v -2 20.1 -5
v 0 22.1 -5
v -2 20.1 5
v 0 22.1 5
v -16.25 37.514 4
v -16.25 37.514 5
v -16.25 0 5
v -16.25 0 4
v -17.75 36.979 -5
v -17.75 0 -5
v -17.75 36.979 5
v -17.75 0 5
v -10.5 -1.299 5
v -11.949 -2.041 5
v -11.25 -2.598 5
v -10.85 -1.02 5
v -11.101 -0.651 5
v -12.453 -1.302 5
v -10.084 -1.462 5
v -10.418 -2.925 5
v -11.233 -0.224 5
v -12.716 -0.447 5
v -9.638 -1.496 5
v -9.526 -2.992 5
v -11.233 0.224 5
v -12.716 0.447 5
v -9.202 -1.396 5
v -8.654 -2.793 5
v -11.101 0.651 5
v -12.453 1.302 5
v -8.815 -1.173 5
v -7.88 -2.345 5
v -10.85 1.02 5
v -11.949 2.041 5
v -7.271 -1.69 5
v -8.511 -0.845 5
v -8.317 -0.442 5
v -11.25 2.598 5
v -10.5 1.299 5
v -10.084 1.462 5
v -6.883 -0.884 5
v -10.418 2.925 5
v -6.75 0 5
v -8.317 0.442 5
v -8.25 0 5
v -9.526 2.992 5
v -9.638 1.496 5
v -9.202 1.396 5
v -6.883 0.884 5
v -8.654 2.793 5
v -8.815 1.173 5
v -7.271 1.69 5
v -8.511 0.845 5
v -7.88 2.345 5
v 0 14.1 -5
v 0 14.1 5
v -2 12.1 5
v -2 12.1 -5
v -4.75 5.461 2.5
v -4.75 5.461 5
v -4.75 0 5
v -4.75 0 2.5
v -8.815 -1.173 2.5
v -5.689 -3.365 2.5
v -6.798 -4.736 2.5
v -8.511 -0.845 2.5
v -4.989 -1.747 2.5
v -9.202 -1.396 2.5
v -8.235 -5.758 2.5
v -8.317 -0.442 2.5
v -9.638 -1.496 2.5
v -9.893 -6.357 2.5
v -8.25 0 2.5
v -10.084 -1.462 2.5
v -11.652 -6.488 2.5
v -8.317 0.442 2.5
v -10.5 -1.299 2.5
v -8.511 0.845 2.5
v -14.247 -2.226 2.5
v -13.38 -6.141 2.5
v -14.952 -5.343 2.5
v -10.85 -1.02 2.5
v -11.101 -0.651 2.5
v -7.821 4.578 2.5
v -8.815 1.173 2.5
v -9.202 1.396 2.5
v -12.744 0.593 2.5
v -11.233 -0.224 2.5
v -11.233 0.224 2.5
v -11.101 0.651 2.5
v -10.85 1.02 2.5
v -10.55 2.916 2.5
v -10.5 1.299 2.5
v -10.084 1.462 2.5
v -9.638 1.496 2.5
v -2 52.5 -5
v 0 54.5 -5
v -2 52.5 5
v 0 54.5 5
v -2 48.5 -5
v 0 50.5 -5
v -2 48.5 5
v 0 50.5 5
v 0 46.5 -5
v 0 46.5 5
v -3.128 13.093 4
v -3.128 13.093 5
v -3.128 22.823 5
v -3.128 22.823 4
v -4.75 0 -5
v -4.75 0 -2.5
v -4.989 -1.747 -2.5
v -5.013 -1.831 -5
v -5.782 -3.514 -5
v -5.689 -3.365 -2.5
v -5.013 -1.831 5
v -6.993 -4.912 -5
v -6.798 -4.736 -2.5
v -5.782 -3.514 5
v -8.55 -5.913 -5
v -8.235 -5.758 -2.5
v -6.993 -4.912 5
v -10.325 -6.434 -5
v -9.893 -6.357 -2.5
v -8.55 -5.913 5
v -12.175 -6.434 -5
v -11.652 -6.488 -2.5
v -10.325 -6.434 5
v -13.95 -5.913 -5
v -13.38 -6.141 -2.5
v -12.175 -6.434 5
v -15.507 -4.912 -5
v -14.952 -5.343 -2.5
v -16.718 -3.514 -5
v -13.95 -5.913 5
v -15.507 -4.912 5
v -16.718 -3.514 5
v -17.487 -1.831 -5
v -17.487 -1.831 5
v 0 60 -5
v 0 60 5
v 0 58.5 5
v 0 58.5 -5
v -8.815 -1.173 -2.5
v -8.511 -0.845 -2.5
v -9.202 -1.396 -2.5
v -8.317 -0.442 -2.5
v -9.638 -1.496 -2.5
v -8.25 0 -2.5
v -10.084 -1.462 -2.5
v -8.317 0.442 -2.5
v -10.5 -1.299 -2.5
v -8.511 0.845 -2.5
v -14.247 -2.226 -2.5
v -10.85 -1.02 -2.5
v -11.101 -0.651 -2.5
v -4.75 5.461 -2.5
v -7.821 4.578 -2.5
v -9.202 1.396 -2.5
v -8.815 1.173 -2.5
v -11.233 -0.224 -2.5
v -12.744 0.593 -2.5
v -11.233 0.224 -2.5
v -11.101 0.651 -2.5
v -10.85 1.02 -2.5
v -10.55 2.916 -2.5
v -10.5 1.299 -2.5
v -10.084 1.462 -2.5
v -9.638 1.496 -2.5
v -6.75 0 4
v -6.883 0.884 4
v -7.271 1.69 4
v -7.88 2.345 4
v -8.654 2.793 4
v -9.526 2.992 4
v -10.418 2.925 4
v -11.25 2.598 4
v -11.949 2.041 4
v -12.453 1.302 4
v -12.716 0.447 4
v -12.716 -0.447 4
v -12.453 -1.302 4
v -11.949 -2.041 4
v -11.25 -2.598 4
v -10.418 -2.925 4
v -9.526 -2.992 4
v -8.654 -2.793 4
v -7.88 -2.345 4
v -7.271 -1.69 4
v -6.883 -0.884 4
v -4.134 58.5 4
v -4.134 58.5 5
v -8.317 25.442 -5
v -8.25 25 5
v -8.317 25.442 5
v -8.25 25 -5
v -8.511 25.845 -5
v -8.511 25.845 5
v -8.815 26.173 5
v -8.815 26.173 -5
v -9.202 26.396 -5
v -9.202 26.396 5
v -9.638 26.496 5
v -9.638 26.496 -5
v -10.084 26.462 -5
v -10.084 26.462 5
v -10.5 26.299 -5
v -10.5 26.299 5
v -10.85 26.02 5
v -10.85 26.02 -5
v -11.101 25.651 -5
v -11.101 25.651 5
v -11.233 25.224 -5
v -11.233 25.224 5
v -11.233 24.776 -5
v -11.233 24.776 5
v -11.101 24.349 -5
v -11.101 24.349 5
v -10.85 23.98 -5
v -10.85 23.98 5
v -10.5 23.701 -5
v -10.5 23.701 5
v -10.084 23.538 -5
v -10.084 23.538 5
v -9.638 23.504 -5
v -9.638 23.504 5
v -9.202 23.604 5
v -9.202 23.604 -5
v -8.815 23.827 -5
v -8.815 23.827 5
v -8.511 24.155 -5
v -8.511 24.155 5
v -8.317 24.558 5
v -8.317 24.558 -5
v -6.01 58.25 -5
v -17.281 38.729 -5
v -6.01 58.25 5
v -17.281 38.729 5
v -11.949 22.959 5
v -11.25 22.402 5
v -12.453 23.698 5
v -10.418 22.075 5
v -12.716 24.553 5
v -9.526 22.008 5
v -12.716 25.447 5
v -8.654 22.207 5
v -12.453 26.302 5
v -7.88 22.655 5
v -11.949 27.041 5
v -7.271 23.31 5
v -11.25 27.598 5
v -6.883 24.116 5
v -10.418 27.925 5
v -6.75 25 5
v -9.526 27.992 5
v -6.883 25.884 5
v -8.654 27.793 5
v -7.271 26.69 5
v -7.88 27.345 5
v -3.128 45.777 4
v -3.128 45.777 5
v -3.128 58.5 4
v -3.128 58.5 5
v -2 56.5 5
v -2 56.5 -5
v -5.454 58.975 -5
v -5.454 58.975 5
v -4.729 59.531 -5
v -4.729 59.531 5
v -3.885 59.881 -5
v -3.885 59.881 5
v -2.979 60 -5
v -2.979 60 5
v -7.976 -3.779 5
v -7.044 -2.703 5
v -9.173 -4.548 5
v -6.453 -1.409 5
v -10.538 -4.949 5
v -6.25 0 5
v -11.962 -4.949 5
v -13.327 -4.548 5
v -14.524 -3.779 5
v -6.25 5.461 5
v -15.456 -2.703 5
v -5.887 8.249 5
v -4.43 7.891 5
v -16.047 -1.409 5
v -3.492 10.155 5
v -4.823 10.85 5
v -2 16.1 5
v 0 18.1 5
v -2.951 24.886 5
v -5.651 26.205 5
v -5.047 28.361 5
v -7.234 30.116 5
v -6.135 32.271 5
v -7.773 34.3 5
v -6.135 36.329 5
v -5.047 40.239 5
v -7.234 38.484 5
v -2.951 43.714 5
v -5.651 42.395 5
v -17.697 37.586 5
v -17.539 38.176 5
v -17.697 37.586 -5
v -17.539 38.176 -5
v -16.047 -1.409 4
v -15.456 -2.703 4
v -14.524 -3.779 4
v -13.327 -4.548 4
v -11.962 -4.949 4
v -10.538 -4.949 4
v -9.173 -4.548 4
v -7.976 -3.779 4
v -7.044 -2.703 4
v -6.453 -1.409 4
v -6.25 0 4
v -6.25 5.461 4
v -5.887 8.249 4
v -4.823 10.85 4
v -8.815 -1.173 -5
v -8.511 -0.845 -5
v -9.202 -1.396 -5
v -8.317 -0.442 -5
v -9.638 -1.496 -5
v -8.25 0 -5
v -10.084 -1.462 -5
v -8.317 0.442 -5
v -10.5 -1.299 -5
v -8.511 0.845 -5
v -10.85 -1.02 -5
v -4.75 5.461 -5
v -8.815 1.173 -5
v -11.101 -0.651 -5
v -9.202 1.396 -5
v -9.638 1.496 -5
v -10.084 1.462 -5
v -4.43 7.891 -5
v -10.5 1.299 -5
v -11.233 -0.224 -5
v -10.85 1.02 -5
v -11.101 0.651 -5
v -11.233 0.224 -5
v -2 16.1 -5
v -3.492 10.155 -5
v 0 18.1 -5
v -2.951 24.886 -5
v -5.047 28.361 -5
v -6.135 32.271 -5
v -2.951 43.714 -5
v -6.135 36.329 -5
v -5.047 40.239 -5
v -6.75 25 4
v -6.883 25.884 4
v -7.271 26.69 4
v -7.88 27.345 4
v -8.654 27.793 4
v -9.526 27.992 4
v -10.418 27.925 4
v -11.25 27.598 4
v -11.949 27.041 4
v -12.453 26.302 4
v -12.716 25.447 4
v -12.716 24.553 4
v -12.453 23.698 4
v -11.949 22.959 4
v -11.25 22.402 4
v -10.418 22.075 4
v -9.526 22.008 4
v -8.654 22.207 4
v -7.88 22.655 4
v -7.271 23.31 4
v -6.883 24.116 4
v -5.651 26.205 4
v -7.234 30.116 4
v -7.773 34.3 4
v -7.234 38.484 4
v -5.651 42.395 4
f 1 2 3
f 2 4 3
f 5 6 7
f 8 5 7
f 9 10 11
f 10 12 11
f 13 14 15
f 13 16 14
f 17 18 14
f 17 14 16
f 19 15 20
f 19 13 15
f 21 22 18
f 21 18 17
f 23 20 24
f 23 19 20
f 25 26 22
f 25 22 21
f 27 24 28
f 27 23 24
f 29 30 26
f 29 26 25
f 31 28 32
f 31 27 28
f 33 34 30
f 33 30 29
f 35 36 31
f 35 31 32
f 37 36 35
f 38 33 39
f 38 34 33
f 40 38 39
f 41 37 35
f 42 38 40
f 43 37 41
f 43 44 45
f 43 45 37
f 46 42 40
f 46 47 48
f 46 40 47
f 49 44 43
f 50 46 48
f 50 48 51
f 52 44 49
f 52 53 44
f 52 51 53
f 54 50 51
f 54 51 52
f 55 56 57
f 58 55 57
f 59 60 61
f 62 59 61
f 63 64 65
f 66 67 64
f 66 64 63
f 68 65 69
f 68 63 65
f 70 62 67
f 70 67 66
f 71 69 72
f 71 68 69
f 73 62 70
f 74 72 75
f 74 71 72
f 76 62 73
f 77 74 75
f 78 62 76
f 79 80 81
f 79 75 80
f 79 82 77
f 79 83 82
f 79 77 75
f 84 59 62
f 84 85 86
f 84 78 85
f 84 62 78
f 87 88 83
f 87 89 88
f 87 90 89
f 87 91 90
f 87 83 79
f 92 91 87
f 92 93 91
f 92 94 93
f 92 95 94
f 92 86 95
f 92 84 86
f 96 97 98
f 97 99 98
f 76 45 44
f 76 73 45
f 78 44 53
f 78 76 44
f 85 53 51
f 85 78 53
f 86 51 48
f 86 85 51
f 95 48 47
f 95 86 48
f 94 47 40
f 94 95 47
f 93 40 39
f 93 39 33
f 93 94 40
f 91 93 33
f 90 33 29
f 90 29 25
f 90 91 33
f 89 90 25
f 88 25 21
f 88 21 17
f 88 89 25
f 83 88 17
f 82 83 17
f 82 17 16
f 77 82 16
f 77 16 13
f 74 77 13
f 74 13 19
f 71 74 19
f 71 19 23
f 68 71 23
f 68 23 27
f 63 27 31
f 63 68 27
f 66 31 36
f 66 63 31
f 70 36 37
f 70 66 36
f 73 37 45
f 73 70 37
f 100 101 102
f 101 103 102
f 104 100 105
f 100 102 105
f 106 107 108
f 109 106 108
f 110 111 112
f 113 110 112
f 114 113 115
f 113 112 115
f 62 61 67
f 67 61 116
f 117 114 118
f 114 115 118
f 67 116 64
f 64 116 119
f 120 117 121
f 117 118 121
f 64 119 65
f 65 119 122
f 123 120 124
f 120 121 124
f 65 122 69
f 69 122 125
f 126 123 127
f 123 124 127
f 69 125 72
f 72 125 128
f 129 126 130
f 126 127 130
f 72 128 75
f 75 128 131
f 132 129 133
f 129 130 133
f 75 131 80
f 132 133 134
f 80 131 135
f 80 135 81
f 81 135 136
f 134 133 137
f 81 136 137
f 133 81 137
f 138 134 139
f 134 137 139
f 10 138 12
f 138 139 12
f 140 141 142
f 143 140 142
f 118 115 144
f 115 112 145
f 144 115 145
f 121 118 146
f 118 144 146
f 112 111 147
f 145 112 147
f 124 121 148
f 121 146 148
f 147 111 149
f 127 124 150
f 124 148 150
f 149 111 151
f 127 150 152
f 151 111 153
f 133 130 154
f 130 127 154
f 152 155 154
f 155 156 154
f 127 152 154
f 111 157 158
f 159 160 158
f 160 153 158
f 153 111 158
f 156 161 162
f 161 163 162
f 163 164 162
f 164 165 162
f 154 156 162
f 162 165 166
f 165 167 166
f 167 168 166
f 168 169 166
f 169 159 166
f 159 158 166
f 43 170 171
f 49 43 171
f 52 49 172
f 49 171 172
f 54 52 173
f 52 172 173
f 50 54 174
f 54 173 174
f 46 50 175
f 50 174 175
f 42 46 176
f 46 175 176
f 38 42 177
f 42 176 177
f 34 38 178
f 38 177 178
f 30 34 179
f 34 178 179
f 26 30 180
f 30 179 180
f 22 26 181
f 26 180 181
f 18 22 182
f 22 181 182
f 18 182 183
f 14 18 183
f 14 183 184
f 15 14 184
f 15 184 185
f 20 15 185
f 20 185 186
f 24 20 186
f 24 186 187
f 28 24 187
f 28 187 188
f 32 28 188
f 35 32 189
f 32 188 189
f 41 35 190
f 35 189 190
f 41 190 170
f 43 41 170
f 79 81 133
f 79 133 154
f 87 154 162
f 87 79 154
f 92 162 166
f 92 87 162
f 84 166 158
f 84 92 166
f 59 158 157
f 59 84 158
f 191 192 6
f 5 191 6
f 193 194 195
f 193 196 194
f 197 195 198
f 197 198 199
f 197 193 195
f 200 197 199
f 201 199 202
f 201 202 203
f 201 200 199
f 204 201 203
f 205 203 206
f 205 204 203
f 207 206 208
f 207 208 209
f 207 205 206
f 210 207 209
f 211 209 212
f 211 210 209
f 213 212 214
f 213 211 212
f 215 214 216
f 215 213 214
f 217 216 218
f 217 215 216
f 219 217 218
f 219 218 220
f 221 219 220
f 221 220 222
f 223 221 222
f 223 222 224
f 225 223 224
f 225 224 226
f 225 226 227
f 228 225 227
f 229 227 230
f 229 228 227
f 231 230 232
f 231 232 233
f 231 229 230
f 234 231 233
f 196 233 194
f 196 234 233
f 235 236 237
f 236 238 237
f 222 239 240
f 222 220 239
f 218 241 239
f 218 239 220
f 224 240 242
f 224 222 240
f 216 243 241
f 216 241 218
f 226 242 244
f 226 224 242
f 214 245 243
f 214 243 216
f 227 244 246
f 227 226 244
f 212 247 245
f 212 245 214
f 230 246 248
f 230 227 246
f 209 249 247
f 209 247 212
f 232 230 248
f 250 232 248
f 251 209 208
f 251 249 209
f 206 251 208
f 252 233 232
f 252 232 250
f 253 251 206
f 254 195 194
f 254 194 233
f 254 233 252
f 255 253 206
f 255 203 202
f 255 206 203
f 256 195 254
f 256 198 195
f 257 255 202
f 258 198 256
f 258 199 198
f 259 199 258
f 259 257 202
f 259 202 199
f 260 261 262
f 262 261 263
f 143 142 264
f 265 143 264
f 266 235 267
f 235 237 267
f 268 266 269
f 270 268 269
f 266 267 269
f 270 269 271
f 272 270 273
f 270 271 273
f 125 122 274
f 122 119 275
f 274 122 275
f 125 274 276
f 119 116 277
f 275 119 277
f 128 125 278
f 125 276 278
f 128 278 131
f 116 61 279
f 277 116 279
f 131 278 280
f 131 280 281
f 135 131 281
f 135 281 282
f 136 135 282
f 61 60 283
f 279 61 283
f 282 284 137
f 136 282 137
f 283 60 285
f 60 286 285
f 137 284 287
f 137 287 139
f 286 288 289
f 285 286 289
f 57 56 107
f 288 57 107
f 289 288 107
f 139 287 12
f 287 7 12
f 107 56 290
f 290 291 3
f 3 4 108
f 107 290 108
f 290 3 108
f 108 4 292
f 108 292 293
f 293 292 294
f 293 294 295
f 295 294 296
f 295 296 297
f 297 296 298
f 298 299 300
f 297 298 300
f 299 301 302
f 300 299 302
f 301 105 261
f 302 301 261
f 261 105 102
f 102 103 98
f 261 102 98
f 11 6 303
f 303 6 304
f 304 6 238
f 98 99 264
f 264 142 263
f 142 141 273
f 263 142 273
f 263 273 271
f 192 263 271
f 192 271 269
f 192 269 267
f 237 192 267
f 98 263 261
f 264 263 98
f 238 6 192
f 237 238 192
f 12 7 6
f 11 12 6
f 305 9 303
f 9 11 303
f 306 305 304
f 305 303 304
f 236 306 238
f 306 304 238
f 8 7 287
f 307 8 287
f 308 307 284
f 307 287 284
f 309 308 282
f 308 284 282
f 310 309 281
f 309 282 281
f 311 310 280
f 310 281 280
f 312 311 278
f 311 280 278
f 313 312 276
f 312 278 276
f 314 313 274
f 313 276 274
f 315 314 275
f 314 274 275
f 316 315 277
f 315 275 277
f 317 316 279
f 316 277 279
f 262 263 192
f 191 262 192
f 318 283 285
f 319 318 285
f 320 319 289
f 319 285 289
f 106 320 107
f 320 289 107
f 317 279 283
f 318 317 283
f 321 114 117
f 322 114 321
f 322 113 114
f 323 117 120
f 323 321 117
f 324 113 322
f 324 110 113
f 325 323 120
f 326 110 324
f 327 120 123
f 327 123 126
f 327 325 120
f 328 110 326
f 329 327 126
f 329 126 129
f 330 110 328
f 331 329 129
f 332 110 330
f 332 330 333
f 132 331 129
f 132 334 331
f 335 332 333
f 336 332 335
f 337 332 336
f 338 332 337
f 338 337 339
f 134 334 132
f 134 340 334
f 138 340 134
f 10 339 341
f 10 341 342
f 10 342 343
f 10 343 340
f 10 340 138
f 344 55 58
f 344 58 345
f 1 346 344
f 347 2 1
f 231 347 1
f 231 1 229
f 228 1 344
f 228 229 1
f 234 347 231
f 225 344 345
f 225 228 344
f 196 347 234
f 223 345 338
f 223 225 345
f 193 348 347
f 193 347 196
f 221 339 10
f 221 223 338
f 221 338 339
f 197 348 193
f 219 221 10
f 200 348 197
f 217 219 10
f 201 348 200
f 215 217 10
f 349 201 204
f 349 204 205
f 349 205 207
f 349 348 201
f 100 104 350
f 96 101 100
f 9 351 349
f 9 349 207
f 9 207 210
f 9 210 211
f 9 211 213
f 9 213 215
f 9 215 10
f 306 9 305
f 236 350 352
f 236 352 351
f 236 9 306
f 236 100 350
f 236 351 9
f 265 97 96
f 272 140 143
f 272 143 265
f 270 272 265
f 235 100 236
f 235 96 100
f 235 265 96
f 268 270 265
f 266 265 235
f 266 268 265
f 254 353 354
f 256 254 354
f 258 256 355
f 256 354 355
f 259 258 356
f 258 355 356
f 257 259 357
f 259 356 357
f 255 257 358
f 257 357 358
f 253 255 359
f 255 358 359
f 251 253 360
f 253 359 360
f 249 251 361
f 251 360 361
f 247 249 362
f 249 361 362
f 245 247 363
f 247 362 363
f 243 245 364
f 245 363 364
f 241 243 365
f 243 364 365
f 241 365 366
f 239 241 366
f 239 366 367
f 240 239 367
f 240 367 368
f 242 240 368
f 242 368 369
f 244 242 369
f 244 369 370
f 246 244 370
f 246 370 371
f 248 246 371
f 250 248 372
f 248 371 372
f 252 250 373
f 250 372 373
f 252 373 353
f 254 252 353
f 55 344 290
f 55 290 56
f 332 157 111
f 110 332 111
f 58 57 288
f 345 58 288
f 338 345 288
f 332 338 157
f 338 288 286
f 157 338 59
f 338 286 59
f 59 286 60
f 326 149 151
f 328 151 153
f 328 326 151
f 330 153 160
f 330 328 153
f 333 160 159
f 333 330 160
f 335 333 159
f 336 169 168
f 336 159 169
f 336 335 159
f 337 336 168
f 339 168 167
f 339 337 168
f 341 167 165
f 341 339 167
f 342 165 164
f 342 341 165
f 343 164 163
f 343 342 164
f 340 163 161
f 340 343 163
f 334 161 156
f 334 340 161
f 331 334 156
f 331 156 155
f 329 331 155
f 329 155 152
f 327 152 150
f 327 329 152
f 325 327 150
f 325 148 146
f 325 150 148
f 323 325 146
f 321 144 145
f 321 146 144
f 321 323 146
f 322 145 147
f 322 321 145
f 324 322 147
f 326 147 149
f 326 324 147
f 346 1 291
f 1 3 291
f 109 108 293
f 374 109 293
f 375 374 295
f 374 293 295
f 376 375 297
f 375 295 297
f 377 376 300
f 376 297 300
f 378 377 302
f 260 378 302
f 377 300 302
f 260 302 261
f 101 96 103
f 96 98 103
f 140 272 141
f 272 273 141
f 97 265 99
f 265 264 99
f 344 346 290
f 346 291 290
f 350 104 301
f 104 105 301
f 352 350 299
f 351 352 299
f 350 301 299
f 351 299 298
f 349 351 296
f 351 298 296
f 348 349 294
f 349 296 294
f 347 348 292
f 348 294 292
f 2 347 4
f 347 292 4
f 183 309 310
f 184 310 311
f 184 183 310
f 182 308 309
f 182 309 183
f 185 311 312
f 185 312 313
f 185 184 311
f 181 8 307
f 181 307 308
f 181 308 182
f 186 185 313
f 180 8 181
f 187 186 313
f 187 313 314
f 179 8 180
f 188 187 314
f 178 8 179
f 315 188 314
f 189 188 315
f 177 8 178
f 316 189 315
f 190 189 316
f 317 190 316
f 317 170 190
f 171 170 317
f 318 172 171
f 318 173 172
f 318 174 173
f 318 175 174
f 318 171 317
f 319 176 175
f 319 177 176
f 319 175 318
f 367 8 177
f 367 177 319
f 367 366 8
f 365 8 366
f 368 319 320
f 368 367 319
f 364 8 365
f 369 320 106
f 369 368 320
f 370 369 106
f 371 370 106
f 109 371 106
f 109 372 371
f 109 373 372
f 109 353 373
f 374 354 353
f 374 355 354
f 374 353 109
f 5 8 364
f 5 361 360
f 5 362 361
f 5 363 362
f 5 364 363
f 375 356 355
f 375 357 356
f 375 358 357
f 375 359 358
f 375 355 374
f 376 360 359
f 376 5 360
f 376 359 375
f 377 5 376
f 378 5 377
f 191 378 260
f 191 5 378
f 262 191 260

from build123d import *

# Parameters (mm, degrees)
SKETCH1_R           = 1.5
BOSS_EXTRUDE1_DEPTH = 5
CUT_EXTRUDE1_DEPTH  = 2.5
CUT_EXTRUDE2_DEPTH  = 1
SKETCH5_R           = 3
SKETCH5_R_2         = 1.5
EXTRUDE_THIN1_DEPTH = 1
FILLET1_R           = 3.5


with BuildPart() as part:
    # Sketch1 → Boss-Extrude1 (new body, symmetric)
    with BuildSketch(Plane.XY):
        with BuildLine():
            Line((0, 58.5), (-2, 56.5))
            Line((-2, 56.5), (0, 54.5))
            Line((0, 54.5), (-2, 52.5))
            Line((-2, 52.5), (0, 50.5))
            Line((0, 50.5), (-2, 48.5))
            Line((-2, 48.5), (0, 46.5))
            ThreePointArc((0, 46.5), (-6.273030308, 34.3), (0, 22.1))
            Line((0, 22.1), (-2, 20.1))
            Line((-2, 20.1), (0, 18.1))
            Line((0, 18.1), (-2, 16.1))
            Line((-2, 16.1), (0, 14.1))
            Line((0, 14.1), (-2, 12.1))
            ThreePointArc((-2, 12.1), (-4.035298286, 9.053960857), (-4.75, 5.460912703))
            Line((-4.75, 5.460912703), (-4.75, 0))
            ThreePointArc((-4.75, 0), (-11.25, -6.5), (-17.75, 0))
            Line((-17.75, 0), (-17.75, 37.916352203))
            Line((-17.75, 37.916352203), (-5, 60))
            Line((-5, 60), (0, 60))
            Line((0, 60), (0, 58.5))
        make_face()
        with Locations((-9.75, 0)):
            Circle(SKETCH1_R, mode=Mode.SUBTRACT)
        with Locations((-9.75, 25)):
            Circle(SKETCH1_R, mode=Mode.SUBTRACT)
    extrude(amount=BOSS_EXTRUDE1_DEPTH, both=True)

    # Sketch3 → Cut-Extrude1 (cut, symmetric)
    with BuildSketch(Plane.XY):
        with BuildLine():
            Line((-15, -38.410797367), (-15, -6.410797367))
            ThreePointArc((-15, -6.410797367), (-12.082951062, 1.431396204), (-4.75, 5.460912703))
            Line((-4.75, 5.460912703), (-4.75, -38.410797367))
            Line((-4.75, -38.410797367), (-15, -38.410797367))
        make_face()
    extrude(amount=CUT_EXTRUDE1_DEPTH, both=True, mode=Mode.SUBTRACT)

    # Sketch4 → Cut-Extrude2 (cut)
    with BuildSketch(Plane.XY.offset(5)):
        with BuildLine():
            Line((-3.12764747, 58.5), (-4.133974596, 58.5))
            Line((-4.133974596, 58.5), (-16.25, 37.514428415))
            Line((-16.25, 37.514428415), (-16.25, 0))
            ThreePointArc((-16.25, 0), (-11.25, -5), (-6.25, 0))
            Line((-6.25, 0), (-6.25, 5.460912703))
            ThreePointArc((-6.25, 5.460912703), (-5.439227916, 9.583992212), (-3.12764747, 13.093084951))
            Line((-3.12764747, 13.093084951), (-3.12764747, 22.82315148))
            ThreePointArc((-3.12764747, 22.82315148), (-7.773030308, 34.3), (-3.12764747, 45.77684852))
            Line((-3.12764747, 45.77684852), (-3.12764747, 58.5))
        make_face()
    extrude(amount=-CUT_EXTRUDE2_DEPTH, mode=Mode.SUBTRACT)

    # Sketch5 → Extrude-Thin1 (add)
    with BuildSketch(Plane.XY.offset(4)):
        with Locations((-9.75, 0)):
            Circle(SKETCH5_R)
        with Locations((-9.75, 0)):
            Circle(SKETCH5_R_2, mode=Mode.SUBTRACT)
        with Locations((-9.75, 25)):
            Circle(SKETCH5_R)
        with Locations((-9.75, 25)):
            Circle(SKETCH5_R_2, mode=Mode.SUBTRACT)
    extrude(amount=EXTRUDE_THIN1_DEPTH)

    # Fillet1
    fillet1_edges = [part.edges().sort_by_distance(p)[0] for p in [
        (-17.75, 37.916352203, 0),
        (-5, 60, 0),
    ]]
    fillet(fillet1_edges, radius=FILLET1_R)


solid = part.part
